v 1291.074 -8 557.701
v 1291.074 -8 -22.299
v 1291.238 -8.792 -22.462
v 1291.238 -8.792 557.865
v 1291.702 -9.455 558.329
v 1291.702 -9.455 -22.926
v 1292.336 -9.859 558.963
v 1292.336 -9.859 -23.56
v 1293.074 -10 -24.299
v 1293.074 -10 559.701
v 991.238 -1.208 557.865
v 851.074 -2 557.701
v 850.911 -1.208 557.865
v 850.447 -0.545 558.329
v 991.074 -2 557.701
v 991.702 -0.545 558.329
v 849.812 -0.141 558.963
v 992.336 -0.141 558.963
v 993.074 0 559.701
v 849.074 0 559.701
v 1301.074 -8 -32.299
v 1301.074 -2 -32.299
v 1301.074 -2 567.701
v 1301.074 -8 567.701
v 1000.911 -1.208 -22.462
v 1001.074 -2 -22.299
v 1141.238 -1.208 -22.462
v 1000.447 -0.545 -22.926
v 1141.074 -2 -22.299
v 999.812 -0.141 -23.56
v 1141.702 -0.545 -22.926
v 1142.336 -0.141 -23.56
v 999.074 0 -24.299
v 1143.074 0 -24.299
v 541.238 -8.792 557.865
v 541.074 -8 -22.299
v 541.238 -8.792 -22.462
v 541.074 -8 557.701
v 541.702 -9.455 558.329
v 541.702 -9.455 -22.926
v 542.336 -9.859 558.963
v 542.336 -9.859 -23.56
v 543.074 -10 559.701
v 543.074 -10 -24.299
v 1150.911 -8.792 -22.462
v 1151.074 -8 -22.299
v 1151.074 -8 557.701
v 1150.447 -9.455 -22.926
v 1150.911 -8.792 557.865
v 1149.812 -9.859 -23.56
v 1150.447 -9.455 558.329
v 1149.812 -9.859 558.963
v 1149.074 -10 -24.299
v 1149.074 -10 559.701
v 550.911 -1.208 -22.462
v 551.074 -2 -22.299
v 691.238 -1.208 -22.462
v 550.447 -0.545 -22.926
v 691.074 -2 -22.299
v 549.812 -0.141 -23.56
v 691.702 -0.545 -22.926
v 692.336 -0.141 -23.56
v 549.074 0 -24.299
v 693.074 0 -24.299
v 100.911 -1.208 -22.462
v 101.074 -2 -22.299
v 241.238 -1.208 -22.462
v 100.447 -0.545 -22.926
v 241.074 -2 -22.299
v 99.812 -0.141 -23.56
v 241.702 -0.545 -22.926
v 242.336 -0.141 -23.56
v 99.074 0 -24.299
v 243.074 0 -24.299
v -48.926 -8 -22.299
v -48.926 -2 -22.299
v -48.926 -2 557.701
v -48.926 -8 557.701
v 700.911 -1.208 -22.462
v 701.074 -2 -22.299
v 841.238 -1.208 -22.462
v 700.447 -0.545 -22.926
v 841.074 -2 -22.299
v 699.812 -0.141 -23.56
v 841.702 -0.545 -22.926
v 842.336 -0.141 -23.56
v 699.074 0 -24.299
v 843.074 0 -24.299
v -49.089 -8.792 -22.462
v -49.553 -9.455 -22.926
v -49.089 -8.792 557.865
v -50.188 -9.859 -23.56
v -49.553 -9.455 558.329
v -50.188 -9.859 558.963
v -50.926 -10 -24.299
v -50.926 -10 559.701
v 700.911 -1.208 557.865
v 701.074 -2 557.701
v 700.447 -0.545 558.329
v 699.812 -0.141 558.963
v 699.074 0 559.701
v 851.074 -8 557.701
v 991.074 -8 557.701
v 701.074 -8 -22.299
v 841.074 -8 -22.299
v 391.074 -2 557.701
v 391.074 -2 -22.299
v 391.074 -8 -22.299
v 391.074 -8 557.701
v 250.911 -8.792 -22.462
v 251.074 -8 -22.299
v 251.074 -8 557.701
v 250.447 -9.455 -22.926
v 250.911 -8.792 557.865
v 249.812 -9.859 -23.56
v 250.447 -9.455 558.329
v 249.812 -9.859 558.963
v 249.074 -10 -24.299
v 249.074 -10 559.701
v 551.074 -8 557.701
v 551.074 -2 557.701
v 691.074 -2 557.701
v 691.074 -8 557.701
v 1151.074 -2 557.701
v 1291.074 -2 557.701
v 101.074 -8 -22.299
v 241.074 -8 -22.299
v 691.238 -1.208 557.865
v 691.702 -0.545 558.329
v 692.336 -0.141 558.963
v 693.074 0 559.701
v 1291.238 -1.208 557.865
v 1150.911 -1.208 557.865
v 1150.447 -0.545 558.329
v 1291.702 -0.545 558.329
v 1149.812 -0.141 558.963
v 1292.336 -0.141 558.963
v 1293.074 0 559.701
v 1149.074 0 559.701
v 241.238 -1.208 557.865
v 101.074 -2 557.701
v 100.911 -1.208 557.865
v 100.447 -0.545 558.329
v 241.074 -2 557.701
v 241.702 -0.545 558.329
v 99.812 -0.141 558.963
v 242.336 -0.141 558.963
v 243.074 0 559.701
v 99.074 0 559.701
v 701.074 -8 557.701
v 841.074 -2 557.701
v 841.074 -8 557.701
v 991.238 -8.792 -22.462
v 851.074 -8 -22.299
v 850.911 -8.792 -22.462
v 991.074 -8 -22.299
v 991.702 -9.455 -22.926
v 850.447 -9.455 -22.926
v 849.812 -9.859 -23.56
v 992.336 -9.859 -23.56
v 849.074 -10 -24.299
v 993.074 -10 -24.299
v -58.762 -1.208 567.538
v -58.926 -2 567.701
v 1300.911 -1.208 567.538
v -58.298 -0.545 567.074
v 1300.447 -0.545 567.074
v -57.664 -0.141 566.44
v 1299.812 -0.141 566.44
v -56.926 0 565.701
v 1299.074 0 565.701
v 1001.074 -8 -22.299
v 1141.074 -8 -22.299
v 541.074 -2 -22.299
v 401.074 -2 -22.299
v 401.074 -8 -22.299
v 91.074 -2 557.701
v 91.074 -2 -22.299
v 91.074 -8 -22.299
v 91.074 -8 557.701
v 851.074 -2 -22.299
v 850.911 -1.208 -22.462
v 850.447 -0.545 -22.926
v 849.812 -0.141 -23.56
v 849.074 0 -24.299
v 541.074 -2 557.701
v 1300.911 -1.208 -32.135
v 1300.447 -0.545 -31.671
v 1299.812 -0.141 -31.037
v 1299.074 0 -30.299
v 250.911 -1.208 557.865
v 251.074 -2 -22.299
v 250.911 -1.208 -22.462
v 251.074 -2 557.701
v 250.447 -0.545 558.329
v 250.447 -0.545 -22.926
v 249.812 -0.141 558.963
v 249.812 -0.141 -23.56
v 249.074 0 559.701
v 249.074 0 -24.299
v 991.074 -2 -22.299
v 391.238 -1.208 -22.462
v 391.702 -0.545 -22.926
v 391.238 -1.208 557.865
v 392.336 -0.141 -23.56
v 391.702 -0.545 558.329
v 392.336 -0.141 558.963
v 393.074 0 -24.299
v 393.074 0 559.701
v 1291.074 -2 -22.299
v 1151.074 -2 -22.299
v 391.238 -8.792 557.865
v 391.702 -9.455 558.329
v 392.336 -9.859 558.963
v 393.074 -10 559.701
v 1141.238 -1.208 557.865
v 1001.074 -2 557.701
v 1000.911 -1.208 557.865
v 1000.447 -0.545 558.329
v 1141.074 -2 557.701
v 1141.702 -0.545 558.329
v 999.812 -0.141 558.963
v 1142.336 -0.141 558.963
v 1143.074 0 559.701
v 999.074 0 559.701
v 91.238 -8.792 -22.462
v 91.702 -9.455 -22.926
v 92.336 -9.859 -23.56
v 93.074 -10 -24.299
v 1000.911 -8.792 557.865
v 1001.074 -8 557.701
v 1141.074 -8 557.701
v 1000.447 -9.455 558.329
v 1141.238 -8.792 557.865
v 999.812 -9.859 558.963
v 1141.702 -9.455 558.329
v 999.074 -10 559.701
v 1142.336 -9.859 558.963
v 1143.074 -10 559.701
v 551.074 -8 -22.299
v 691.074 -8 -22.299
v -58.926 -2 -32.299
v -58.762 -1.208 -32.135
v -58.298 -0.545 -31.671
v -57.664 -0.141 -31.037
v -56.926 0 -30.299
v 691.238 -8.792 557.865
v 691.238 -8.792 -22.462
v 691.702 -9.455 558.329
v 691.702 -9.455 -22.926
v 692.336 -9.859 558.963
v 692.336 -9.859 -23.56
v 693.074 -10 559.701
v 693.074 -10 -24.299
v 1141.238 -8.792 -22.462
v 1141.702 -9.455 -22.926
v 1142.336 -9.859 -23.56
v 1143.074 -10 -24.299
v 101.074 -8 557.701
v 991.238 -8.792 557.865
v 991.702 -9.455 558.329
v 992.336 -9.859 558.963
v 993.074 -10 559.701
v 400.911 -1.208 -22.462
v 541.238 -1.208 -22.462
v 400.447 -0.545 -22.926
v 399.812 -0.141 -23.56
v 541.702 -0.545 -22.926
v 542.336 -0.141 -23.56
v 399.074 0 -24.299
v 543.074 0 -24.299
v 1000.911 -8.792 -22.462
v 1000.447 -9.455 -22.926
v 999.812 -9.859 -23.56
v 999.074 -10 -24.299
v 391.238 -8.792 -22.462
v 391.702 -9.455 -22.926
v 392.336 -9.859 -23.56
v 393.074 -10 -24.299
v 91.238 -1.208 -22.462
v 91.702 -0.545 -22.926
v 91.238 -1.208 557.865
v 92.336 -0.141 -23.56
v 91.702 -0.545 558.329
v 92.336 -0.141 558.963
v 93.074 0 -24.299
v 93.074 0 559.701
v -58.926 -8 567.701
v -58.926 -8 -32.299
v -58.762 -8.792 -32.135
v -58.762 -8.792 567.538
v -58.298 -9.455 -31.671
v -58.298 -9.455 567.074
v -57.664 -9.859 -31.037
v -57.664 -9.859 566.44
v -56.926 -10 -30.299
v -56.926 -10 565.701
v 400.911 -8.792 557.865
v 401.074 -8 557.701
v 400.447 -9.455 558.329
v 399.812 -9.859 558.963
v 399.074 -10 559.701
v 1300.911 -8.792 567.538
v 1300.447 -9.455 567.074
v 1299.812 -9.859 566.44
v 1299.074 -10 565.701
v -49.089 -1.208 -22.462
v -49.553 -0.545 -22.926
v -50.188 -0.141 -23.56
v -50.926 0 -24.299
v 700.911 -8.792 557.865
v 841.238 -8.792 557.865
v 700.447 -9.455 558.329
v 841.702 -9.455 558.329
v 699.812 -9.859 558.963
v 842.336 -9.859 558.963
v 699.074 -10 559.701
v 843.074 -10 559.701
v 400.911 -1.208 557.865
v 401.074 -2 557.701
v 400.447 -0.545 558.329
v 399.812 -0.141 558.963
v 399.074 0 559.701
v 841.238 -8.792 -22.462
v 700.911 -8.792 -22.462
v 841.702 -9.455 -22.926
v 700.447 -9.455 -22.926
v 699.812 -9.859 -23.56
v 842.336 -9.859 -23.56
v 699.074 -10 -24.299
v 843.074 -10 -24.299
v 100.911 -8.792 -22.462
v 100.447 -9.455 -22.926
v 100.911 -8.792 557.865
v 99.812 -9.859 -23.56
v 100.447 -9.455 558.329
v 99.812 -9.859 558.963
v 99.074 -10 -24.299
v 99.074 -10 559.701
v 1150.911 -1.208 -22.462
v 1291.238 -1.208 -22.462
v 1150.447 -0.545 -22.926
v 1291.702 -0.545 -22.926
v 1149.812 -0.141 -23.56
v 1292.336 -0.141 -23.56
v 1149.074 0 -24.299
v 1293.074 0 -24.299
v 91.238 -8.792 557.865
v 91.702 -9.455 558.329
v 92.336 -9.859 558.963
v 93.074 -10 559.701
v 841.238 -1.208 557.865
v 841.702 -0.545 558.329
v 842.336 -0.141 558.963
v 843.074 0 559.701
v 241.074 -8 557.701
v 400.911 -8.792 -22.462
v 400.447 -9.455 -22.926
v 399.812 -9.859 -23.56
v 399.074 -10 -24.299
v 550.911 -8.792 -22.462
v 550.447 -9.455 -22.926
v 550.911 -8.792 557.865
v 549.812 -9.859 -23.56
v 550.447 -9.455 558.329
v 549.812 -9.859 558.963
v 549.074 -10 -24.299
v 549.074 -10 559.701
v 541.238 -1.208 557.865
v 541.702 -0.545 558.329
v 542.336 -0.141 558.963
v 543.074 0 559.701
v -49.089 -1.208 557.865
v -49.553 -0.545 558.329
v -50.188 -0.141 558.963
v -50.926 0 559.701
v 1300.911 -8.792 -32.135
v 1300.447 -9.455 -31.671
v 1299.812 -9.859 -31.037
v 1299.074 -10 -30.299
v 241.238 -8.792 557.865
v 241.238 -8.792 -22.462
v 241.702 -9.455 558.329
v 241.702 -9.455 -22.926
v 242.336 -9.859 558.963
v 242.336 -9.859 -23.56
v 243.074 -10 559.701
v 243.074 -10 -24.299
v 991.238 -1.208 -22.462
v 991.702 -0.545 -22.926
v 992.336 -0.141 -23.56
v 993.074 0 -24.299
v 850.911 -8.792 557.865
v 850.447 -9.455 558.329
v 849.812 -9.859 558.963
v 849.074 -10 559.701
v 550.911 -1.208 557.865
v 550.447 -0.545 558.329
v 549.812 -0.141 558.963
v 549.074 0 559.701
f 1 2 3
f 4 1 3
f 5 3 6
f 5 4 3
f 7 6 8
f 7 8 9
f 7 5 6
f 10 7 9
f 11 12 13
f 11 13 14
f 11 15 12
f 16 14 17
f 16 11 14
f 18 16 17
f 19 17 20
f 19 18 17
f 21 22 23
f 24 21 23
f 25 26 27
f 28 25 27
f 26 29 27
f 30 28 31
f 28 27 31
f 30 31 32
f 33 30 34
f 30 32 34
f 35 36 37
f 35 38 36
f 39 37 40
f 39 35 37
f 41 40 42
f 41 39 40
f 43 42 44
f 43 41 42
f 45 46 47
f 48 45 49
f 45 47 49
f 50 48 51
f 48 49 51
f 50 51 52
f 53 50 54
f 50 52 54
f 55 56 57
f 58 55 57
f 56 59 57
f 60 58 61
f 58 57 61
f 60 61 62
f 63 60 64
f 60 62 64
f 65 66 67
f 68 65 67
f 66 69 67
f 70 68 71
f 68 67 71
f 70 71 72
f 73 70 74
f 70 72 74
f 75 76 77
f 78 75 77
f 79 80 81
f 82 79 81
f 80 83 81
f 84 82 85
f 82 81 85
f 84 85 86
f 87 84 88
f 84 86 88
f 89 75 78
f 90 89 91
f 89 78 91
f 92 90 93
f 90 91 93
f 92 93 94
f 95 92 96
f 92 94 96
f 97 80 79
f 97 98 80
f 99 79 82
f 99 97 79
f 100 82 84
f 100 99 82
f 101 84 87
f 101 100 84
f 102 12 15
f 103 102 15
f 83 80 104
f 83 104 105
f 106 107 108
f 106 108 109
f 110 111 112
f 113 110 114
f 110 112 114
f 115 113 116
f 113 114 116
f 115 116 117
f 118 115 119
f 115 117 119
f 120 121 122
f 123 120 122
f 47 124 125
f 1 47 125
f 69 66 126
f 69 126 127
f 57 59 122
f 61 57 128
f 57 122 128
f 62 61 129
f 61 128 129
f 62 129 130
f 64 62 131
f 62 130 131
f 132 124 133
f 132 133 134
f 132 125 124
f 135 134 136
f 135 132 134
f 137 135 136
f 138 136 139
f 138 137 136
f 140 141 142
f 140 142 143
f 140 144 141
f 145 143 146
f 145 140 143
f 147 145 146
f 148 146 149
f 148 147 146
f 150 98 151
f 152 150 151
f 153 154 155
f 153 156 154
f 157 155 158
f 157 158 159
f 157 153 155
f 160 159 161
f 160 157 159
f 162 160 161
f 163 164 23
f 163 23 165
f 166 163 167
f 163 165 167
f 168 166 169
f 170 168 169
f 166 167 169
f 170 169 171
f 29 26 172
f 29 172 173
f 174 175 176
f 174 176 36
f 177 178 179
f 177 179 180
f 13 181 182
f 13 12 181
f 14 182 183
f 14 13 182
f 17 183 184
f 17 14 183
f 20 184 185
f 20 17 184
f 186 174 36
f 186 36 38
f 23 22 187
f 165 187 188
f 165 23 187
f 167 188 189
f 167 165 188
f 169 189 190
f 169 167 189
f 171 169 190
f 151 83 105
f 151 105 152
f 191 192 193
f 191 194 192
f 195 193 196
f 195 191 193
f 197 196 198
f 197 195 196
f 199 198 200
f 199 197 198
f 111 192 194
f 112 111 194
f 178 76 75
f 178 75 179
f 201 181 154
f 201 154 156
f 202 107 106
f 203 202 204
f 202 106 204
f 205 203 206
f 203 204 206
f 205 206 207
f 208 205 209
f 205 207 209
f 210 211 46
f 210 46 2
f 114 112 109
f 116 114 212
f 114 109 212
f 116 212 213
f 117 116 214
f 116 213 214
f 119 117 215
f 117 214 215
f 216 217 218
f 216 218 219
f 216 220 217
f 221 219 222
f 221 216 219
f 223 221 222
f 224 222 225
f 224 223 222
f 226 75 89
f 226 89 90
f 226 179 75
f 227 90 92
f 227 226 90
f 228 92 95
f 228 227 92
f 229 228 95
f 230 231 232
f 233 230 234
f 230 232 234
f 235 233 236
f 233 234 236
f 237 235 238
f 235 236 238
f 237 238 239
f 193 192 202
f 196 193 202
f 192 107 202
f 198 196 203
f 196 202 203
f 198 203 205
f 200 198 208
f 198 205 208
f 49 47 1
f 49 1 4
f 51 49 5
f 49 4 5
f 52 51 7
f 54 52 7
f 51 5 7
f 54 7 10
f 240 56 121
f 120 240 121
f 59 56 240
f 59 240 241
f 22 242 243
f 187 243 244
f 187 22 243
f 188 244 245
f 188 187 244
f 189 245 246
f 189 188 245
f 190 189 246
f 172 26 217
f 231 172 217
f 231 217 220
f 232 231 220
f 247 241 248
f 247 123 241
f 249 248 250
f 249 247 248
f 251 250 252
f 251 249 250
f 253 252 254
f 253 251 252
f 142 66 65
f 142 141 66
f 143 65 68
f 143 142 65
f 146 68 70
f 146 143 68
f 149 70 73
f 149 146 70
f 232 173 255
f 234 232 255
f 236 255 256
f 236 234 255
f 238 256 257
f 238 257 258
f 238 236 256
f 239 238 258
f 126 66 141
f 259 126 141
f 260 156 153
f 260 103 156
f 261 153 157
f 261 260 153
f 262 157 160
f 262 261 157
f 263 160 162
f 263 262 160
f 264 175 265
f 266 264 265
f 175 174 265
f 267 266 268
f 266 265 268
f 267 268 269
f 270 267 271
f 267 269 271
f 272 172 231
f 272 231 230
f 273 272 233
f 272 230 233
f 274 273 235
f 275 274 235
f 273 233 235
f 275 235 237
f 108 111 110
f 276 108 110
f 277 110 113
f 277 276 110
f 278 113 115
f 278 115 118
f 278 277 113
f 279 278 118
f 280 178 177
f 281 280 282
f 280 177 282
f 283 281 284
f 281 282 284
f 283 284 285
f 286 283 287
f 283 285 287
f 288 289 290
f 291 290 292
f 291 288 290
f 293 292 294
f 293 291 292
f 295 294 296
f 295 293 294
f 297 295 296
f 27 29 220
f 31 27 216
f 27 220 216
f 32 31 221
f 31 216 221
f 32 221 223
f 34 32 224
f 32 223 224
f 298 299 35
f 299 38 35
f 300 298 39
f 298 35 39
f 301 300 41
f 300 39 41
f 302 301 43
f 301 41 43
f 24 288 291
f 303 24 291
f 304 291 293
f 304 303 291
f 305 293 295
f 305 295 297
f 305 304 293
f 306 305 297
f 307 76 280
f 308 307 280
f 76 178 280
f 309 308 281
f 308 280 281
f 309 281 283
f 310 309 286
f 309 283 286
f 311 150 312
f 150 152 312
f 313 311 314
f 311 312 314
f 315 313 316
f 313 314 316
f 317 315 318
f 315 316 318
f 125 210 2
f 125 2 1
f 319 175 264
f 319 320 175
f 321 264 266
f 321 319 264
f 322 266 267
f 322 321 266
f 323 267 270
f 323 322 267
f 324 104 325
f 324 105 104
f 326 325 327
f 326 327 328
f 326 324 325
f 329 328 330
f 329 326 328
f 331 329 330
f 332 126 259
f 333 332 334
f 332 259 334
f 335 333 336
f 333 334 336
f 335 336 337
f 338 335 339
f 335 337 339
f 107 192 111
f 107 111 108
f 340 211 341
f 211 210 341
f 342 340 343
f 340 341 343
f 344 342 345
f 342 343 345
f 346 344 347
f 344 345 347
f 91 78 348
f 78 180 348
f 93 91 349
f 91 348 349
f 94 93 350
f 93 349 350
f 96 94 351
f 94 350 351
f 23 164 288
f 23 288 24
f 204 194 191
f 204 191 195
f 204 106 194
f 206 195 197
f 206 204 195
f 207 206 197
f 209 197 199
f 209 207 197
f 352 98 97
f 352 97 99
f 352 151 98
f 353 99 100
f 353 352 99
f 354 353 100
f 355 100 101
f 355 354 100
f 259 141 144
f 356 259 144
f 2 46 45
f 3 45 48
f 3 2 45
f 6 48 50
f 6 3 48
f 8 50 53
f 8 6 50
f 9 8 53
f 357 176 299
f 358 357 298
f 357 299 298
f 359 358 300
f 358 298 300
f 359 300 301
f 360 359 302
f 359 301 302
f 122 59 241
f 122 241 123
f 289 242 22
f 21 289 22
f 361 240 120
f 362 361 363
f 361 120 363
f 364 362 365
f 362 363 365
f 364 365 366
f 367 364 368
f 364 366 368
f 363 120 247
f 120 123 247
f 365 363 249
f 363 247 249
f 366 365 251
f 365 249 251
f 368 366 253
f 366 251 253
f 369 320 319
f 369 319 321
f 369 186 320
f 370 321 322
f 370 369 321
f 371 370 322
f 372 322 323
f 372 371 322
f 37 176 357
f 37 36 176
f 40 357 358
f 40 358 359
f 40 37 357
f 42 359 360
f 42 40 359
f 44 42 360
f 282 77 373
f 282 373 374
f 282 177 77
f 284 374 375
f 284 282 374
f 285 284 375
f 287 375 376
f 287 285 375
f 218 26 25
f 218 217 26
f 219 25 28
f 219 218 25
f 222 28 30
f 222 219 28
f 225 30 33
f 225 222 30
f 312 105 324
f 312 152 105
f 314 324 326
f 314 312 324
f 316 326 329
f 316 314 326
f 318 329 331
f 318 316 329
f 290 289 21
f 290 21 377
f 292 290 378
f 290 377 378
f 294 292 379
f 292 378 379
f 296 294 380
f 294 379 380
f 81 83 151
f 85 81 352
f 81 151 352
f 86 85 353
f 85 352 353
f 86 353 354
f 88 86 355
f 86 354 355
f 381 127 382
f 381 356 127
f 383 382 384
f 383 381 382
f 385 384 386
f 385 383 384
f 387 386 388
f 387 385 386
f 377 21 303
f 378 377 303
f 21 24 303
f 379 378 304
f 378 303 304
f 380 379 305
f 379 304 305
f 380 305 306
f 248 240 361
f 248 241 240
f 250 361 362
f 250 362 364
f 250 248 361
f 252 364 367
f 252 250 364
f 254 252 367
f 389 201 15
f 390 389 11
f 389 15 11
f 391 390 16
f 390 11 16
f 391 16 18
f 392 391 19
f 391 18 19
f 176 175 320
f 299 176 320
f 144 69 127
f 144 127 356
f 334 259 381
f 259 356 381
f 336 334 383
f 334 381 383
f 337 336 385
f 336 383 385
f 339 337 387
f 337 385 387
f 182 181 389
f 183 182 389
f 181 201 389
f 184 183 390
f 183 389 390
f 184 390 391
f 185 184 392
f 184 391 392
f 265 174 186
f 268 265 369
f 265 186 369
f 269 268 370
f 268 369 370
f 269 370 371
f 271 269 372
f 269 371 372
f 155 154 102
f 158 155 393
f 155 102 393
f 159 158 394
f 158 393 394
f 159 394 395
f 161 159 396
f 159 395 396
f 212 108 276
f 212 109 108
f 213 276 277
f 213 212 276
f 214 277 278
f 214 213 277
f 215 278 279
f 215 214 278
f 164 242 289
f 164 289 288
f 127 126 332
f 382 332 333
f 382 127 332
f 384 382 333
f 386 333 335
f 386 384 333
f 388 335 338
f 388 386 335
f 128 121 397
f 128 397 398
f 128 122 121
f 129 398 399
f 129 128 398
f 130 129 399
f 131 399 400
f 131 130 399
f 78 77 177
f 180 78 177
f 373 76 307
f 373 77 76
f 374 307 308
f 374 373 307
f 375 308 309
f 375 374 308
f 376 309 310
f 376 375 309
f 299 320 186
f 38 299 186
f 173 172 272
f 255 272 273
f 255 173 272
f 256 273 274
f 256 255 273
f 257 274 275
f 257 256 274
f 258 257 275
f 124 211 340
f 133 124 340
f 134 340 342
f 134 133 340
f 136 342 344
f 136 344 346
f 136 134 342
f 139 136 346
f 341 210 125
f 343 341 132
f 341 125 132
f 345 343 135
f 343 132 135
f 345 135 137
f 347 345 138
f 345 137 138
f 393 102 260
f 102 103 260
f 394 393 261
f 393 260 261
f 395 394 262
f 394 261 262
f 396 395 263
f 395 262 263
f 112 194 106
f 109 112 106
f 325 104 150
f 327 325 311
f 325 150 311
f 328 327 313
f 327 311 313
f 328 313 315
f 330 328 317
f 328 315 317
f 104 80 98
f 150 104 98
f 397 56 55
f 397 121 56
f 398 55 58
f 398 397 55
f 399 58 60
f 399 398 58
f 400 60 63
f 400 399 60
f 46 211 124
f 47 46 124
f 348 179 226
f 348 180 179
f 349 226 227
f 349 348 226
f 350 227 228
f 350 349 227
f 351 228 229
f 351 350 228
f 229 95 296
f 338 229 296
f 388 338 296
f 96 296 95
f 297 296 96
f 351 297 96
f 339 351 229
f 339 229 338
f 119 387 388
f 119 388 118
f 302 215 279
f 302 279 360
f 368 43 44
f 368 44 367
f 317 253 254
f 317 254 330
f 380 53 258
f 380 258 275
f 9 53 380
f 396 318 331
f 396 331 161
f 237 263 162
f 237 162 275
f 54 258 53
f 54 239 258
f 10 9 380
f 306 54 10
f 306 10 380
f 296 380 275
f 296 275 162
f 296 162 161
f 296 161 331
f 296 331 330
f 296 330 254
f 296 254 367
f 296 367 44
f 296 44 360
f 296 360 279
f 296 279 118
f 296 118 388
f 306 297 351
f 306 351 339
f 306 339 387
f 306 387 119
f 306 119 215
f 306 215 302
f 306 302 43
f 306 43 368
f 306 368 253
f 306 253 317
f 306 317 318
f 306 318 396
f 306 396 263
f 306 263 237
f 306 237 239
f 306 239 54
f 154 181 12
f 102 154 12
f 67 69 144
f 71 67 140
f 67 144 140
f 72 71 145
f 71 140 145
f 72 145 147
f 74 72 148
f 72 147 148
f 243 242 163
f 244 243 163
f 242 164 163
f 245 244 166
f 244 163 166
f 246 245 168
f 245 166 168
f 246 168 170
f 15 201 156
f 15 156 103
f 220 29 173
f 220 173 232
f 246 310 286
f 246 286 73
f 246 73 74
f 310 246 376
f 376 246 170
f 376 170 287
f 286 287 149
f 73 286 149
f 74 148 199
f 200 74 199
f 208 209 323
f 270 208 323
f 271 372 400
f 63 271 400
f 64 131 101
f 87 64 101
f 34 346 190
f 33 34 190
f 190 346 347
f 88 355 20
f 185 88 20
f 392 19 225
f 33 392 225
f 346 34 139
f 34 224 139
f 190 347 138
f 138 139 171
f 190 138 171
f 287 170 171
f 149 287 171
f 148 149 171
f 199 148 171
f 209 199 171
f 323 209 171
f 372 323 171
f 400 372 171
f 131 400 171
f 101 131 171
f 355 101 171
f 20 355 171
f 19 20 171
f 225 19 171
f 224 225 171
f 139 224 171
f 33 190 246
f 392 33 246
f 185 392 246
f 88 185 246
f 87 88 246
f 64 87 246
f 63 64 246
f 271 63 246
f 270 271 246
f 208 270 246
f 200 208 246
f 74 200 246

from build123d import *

# Parameters (mm, degrees)
F0_W     = 1360
F0_H     = 600
F0_W_2   = 140
F0_H_2   = 580
F1_DEPTH = 10
F2_R     = 2


with BuildPart() as f1:
    # F0 (on Front) → F1 (new body)
    with BuildSketch(Plane.XZ):
        with Locations((621.074081, 267.701469)):
            Rectangle(F0_W, F0_H)
        with Locations((21.074081, 267.701469)):
            Rectangle(F0_W_2, F0_H_2, mode=Mode.SUBTRACT)
        with Locations((171.074081, 267.701469)):
            Rectangle(F0_W_2, F0_H_2, mode=Mode.SUBTRACT)
        with Locations((321.074081, 267.701469)):
            Rectangle(F0_W_2, F0_H_2, mode=Mode.SUBTRACT)
        with Locations((471.074081, 267.701469)):
            Rectangle(F0_W_2, F0_H_2, mode=Mode.SUBTRACT)
        with Locations((621.074081, 267.701469)):
            Rectangle(F0_W_2, F0_H_2, mode=Mode.SUBTRACT)
        with Locations((771.074081, 267.701469)):
            Rectangle(F0_W_2, F0_H_2, mode=Mode.SUBTRACT)
        with Locations((921.074081, 267.701469)):
            Rectangle(F0_W_2, F0_H_2, mode=Mode.SUBTRACT)
        with Locations((1071.074081, 267.701469)):
            Rectangle(F0_W_2, F0_H_2, mode=Mode.SUBTRACT)
        with Locations((1221.074081, 267.701469)):
            Rectangle(F0_W_2, F0_H_2, mode=Mode.SUBTRACT)
    extrude(amount=F1_DEPTH)

    # F2
    f2_edges = [f1.edges().sort_by_distance(p)[0] for p in [
        (1221.074081, -10, -22.298531),
        (1151.074081, -10, 267.701469),
        (1071.074081, -10, -22.298531),
        (1141.074081, -10, 267.701469),
        (1221.074081, 0, -22.298531),
        (1151.074081, 0, 267.701469),
        (621.074081, -10, -32.298531),
        (1301.074081, -10, 267.701469),
        (1301.074081, 0, 267.701469),
        (1291.074081, -10, 267.701469),
        (621.074081, 0, -32.298531),
        (1291.074081, 0, 267.701469),
        (1141.074081, 0, 267.701469),
        (1071.074081, 0, -22.298531),
        (1001.074081, 0, 267.701469),
        (991.074081, 0, 267.701469),
        (991.074081, -10, 267.701469),
        (921.074081, 0, -22.298531),
        (841.074081, 0, 267.701469),
        (841.074081, -10, 267.701469),
        (771.074081, 0, -22.298531),
        (851.074081, 0, 267.701469),
        (701.074081, 0, 267.701469),
        (691.074081, 0, 267.701469),
        (691.074081, -10, 267.701469),
        (621.074081, 0, -22.298531),
        (551.074081, 0, 267.701469),
        (541.074081, 0, 267.701469),
        (541.074081, -10, 267.701469),
        (471.074081, 0, -22.298531),
        (401.074081, 0, 267.701469),
        (391.074081, 0, 267.701469),
        (321.074081, 0, -22.298531),
        (391.074081, -10, 267.701469),
        (251.074081, 0, 267.701469),
        (241.074081, 0, 267.701469),
        (241.074081, -10, 267.701469),
        (171.074081, 0, -22.298531),
        (101.074081, 0, 267.701469),
        (91.074081, 0, 267.701469),
        (91.074081, -10, 267.701469),
        (21.074081, 0, -22.298531),
        (-48.925919, 0, 267.701469),
        (-58.925919, 0, 267.701469),
        (-58.925919, -10, 267.701469),
        (21.074081, -10, 557.701469),
        (621.074081, 0, 567.701469),
        (171.074081, 0, 557.701469),
        (171.074081, -10, 557.701469),
        (471.074081, -10, 557.701469),
        (471.074081, 0, 557.701469),
        (321.074081, -10, 557.701469),
        (321.074081, 0, 557.701469),
        (771.074081, -10, 557.701469),
        (771.074081, 0, 557.701469),
        (621.074081, -10, 557.701469),
        (621.074081, 0, 557.701469),
        (1071.074081, -10, 557.701469),
        (1071.074081, 0, 557.701469),
        (921.074081, -10, 557.701469),
        (921.074081, 0, 557.701469),
        (1221.074081, -10, 557.701469),
        (1221.074081, 0, 557.701469),
        (1001.074081, -10, 267.701469),
        (851.074081, -10, 267.701469),
        (701.074081, -10, 267.701469),
        (551.074081, -10, 267.701469),
        (401.074081, -10, 267.701469),
        (251.074081, -10, 267.701469),
        (101.074081, -10, 267.701469),
        (-48.925919, -10, 267.701469),
        (621.074081, -10, 567.701469),
        (921.074081, -10, -22.298531),
        (771.074081, -10, -22.298531),
        (621.074081, -10, -22.298531),
        (471.074081, -10, -22.298531),
        (321.074081, -10, -22.298531),
        (171.074081, -10, -22.298531),
        (21.074081, -10, -22.298531),
        (21.074081, 0, 557.701469),
    ]]
    fillet(f2_edges, radius=F2_R)


solid = f1.part
